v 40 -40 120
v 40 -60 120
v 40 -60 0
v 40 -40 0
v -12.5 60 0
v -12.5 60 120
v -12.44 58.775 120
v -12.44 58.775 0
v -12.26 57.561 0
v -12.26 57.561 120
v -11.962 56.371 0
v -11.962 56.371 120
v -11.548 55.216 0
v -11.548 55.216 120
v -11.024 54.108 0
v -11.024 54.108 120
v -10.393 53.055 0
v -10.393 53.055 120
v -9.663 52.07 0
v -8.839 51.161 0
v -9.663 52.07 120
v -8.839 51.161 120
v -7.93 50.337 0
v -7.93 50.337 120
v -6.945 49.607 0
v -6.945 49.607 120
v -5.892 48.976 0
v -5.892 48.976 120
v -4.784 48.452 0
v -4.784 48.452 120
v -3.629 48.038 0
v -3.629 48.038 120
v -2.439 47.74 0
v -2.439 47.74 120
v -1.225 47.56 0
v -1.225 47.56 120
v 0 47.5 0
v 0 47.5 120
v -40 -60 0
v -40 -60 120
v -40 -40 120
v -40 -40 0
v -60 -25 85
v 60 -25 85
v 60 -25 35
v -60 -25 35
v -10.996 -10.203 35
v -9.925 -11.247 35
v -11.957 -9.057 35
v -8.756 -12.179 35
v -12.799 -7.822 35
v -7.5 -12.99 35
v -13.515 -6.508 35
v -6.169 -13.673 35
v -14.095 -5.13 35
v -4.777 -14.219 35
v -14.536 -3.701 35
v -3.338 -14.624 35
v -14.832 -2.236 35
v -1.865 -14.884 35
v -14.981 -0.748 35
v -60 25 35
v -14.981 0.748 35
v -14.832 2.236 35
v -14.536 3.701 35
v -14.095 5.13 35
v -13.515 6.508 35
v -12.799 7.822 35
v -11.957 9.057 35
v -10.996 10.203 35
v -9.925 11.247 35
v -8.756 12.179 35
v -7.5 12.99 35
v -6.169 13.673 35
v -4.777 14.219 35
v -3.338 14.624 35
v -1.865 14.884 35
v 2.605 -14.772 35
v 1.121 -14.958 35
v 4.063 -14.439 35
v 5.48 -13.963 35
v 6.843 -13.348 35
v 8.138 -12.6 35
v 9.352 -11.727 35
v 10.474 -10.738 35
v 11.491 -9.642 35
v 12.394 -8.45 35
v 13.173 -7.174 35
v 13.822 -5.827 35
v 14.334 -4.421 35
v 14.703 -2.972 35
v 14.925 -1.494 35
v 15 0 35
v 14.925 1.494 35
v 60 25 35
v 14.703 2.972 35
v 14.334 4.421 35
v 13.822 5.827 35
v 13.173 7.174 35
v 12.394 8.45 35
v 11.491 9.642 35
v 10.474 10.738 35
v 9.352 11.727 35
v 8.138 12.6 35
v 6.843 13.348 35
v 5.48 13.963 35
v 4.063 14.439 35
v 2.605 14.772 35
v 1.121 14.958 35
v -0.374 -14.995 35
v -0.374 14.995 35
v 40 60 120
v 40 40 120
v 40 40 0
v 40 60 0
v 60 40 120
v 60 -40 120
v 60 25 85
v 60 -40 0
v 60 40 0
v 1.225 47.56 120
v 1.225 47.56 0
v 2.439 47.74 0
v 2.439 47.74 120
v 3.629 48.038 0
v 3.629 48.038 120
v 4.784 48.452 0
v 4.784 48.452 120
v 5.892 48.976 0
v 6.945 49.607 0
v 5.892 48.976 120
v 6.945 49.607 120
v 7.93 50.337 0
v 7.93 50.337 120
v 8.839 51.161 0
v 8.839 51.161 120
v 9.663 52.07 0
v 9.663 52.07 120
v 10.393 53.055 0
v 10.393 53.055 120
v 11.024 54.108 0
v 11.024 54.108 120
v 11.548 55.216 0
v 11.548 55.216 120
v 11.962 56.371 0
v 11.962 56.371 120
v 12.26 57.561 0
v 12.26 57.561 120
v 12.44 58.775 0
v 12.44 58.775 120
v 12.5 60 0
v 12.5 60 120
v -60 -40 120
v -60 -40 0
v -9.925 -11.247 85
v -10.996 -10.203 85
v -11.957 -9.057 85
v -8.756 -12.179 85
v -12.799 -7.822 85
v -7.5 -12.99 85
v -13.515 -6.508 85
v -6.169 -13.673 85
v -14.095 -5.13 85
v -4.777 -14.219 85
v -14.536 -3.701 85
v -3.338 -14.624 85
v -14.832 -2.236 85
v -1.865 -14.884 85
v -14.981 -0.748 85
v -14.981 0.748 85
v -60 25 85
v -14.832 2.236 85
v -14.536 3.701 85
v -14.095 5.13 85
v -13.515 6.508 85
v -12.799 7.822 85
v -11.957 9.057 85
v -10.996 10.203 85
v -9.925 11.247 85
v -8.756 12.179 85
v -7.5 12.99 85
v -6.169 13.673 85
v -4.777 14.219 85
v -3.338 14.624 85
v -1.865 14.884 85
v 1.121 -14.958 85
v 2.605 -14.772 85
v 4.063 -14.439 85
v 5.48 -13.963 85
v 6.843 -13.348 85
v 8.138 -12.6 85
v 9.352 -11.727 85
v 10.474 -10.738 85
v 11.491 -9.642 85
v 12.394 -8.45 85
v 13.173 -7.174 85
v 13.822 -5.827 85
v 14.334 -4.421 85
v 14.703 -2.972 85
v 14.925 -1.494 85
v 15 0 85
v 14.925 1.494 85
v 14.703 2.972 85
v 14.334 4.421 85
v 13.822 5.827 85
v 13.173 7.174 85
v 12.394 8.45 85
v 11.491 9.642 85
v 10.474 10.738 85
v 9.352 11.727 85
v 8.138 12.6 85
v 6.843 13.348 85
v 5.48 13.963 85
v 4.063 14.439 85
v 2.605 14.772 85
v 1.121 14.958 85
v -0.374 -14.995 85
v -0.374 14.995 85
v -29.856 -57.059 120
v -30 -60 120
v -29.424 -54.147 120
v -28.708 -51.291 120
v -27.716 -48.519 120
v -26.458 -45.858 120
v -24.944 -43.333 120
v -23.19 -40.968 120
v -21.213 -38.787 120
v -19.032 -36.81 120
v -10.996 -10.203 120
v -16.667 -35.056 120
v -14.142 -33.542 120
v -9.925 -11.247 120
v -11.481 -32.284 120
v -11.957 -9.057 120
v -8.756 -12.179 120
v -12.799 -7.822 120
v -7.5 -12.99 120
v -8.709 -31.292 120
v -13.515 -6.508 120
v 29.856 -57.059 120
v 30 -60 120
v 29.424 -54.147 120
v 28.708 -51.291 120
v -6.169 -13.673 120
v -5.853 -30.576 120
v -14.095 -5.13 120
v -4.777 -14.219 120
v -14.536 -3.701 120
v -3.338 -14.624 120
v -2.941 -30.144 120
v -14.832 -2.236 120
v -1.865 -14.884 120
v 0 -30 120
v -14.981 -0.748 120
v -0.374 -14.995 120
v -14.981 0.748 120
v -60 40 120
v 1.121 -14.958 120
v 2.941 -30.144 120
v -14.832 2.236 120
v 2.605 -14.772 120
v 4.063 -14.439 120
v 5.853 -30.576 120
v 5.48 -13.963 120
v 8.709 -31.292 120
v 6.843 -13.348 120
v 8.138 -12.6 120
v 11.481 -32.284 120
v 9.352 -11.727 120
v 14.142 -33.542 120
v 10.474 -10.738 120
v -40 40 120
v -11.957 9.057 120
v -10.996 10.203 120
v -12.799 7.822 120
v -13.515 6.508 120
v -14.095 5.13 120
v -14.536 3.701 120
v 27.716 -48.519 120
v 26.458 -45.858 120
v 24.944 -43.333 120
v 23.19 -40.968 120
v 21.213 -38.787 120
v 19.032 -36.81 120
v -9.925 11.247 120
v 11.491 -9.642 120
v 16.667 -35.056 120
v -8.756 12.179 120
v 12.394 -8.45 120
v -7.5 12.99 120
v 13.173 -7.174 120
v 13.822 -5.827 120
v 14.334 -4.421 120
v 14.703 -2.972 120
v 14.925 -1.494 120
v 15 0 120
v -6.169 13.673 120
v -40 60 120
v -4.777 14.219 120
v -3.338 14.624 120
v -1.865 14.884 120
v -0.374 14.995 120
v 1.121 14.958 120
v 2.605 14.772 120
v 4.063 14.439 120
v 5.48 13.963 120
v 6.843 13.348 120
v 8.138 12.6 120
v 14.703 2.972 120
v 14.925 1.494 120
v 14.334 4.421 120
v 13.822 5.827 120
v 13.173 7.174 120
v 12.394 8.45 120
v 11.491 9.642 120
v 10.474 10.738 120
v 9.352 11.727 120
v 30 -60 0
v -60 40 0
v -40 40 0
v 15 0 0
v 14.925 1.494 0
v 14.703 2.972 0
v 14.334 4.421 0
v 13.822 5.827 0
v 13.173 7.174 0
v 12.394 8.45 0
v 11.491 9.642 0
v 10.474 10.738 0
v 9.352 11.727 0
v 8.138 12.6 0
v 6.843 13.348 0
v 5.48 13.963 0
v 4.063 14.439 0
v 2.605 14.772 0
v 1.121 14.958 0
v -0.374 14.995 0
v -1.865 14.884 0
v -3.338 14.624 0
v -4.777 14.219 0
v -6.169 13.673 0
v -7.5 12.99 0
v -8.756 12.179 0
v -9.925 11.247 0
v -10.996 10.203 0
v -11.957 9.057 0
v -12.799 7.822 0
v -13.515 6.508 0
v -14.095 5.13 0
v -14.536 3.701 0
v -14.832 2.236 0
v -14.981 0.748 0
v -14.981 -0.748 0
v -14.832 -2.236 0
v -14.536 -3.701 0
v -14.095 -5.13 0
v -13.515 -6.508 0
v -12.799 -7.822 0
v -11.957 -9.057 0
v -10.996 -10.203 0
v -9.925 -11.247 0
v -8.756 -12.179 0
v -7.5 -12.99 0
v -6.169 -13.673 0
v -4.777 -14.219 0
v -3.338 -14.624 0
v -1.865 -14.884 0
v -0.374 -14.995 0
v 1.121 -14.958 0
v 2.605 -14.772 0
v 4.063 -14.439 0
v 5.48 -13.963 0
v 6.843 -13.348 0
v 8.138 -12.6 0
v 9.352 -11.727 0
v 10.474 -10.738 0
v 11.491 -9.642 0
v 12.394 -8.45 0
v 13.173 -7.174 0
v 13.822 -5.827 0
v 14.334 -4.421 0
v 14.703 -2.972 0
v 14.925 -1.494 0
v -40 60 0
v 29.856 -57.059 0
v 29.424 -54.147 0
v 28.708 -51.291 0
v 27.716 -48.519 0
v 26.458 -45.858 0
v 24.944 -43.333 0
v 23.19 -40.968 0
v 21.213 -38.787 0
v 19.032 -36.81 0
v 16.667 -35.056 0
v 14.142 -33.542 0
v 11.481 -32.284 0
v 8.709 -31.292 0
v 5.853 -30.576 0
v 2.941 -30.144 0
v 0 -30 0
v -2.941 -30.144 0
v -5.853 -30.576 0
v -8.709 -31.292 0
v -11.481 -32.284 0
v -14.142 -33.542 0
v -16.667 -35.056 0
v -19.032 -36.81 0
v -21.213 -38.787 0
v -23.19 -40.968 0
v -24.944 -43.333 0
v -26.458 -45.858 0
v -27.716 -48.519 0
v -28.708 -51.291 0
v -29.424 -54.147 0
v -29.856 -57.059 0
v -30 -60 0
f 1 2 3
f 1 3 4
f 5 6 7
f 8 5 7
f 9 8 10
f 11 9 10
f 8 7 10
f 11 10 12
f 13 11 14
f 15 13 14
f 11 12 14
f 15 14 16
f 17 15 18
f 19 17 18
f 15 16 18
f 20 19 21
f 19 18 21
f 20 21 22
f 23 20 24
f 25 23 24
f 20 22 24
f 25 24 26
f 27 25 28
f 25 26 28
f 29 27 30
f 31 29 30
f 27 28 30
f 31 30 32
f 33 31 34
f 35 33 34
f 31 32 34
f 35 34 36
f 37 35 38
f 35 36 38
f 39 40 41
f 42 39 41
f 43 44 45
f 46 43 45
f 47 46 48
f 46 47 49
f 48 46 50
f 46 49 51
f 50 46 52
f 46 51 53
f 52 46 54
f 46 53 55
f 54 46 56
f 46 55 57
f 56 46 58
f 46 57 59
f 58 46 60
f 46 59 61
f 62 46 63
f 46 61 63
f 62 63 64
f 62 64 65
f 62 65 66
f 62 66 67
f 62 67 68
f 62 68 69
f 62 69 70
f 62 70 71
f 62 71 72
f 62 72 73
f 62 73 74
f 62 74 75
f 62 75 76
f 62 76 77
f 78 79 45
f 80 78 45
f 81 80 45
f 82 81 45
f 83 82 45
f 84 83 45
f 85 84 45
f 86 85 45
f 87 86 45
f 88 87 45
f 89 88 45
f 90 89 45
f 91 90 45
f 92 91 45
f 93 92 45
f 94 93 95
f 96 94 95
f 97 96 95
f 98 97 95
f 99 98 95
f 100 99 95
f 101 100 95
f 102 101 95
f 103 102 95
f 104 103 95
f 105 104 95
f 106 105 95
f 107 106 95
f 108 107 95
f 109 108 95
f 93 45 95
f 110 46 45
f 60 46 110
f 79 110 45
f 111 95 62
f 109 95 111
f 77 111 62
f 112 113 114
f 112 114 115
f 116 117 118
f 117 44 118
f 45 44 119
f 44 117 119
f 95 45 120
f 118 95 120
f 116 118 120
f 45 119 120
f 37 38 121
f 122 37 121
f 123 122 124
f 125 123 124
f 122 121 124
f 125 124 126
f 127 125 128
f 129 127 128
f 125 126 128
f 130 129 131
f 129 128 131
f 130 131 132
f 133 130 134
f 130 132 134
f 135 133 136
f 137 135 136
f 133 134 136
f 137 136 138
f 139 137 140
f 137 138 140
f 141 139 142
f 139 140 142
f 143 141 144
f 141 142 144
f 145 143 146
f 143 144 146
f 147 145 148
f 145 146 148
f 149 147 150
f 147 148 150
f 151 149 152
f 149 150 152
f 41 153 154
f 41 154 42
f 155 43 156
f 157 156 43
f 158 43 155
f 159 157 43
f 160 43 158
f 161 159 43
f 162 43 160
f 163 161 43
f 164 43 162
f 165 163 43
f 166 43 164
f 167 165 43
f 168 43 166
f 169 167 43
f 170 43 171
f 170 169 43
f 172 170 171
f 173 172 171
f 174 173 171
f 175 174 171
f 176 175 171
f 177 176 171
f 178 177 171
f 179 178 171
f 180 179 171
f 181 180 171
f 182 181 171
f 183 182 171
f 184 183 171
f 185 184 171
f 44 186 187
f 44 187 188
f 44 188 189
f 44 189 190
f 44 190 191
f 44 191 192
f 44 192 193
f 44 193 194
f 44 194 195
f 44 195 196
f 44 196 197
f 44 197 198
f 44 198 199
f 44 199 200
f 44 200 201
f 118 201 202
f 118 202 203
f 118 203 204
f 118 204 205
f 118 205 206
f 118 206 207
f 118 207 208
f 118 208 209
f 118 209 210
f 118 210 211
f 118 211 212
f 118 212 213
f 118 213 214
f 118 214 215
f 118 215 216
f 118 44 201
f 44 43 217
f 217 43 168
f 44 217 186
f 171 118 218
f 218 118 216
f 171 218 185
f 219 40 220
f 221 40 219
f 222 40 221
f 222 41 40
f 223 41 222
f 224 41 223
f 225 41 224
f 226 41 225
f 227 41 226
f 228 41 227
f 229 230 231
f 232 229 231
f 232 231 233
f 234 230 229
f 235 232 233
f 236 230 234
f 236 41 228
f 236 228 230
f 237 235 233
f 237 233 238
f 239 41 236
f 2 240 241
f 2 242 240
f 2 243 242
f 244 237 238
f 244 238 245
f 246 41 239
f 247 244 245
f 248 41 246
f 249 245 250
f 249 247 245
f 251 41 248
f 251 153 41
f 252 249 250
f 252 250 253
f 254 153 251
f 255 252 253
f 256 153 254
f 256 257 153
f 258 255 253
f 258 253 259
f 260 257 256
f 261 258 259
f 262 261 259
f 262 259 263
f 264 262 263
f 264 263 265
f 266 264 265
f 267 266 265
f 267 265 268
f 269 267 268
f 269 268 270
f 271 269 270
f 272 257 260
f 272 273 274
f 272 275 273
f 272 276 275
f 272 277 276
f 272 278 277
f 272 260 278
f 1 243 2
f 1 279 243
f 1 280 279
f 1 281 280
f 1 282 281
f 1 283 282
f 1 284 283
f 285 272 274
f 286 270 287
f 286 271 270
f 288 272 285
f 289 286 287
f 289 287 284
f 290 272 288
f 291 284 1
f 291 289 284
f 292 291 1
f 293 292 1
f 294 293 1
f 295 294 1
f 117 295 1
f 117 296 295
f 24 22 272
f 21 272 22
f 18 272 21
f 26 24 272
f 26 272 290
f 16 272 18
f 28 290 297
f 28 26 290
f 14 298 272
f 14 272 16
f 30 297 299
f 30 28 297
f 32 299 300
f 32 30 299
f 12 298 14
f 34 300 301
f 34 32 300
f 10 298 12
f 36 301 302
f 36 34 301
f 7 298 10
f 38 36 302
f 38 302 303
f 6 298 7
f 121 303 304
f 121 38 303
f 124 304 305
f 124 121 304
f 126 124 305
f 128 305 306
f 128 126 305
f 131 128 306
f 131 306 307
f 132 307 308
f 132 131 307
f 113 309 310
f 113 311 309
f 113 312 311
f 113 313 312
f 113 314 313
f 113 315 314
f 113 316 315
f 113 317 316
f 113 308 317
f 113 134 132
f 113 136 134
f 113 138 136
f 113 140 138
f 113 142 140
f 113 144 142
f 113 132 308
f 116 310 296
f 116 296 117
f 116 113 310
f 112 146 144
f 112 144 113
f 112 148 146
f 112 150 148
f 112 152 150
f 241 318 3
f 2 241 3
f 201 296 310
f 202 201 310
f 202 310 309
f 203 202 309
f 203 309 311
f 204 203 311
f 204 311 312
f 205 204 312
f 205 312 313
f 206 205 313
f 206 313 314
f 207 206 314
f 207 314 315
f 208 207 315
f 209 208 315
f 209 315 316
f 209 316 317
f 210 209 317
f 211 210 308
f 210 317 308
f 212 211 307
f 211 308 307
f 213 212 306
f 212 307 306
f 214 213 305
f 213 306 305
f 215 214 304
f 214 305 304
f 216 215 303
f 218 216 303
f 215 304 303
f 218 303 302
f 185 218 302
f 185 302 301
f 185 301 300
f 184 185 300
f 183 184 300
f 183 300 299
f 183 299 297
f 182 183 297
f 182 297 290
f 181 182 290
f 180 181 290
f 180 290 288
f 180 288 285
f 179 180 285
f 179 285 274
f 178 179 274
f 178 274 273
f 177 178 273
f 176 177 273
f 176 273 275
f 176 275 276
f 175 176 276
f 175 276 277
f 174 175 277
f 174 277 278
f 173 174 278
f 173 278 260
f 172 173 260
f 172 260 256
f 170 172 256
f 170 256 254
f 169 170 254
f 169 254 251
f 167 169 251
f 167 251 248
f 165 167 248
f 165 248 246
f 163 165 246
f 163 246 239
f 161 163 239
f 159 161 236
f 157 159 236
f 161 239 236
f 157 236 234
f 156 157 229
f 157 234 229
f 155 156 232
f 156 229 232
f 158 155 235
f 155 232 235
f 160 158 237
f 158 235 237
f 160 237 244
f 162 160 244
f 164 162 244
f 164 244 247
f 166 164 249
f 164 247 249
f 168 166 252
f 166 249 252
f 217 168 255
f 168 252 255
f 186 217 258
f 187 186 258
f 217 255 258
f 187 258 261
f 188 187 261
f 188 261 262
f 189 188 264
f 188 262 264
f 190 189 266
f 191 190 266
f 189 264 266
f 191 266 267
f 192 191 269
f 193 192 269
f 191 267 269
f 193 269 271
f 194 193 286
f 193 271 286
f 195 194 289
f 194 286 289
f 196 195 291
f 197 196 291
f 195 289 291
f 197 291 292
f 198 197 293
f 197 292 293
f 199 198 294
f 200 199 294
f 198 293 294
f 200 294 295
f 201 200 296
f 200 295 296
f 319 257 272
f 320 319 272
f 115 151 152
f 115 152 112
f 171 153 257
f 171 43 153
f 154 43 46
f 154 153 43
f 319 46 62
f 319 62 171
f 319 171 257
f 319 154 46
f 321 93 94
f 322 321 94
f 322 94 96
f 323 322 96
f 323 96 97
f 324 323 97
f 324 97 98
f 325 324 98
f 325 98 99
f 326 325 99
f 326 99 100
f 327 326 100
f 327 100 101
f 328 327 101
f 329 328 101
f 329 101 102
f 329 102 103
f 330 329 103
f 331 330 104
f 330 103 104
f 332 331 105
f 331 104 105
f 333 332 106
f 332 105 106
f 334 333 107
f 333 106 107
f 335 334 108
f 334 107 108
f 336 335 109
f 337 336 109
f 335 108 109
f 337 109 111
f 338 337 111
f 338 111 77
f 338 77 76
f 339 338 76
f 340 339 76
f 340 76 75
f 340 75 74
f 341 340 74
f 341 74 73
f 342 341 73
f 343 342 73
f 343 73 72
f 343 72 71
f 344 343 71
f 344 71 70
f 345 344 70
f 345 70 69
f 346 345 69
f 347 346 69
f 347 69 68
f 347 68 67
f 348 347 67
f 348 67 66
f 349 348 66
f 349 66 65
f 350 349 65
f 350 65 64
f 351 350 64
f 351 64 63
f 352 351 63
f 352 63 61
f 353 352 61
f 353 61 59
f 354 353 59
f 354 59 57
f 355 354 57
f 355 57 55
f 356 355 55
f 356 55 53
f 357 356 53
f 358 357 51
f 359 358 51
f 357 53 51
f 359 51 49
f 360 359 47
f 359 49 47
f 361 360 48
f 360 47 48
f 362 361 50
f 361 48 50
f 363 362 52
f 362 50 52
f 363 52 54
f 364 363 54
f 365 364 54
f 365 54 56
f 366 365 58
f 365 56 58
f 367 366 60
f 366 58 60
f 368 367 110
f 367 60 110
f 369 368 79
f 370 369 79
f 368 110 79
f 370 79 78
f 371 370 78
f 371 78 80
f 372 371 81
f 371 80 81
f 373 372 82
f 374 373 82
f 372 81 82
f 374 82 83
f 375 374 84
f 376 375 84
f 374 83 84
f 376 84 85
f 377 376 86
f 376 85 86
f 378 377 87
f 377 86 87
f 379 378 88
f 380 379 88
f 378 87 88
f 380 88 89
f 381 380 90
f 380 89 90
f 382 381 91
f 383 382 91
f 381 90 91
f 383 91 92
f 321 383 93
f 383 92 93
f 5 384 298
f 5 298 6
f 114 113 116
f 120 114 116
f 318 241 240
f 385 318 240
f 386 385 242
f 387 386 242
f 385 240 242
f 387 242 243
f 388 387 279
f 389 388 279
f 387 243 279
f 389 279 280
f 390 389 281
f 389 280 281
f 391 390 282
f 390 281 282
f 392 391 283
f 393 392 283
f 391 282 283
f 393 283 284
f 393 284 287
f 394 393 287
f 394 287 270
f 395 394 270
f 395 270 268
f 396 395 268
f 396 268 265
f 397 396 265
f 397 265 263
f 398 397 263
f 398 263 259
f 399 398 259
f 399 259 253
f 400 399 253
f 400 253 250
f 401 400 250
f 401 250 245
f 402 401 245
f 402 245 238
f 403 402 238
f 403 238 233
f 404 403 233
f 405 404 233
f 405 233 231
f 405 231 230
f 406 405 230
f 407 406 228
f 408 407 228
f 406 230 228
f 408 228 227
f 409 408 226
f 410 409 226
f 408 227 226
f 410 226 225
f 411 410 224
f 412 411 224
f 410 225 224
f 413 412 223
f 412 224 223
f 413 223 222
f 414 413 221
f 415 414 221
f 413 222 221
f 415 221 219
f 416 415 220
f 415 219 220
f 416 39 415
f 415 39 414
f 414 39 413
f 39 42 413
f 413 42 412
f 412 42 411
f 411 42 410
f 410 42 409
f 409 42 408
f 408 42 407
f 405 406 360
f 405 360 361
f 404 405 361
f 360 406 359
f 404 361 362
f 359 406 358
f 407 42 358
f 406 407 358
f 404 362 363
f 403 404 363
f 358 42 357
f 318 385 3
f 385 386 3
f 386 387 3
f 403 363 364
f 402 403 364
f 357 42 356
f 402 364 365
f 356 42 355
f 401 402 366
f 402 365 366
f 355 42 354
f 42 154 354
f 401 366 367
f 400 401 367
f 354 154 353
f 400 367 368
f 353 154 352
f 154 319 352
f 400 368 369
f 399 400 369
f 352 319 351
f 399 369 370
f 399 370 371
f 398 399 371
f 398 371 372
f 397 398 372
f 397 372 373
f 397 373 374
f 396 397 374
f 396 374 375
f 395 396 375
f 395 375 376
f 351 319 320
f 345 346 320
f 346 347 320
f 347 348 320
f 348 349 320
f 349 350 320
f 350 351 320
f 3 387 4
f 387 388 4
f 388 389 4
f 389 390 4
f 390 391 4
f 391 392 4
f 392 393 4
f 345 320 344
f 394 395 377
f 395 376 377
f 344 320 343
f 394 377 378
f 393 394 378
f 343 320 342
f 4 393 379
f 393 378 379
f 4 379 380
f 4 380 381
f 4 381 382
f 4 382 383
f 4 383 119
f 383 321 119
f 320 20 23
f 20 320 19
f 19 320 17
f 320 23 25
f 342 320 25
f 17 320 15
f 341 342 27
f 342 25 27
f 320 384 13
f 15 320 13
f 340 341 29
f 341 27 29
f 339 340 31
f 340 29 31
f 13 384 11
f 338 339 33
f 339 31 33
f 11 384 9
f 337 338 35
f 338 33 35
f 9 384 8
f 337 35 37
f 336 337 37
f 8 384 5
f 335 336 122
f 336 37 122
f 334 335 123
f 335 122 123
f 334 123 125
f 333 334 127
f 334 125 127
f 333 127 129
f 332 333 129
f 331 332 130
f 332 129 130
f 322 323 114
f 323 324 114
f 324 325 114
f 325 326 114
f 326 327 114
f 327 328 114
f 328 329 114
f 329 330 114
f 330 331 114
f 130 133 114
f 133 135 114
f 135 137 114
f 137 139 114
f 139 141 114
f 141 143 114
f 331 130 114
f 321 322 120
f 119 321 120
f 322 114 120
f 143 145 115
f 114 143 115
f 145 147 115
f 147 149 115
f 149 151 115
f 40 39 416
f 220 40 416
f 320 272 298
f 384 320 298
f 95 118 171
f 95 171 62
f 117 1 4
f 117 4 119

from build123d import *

# Parameters (mm, degrees)
SKETCH1_W           = 120
SKETCH1_H           = 120
BOSS_EXTRUDE1_DEPTH = 120
SKETCH2_R           = 30
SKETCH2_W           = 20
SKETCH2_H           = 20
CUT_EXTRUDE1_DEPTH  = 120
SKETCH4_R           = 15
CUT_EXTRUDE2_DEPTH  = 120
SKETCH5_W           = 20
SKETCH5_H           = 20
CUT_EXTRUDE3_DEPTH  = 120
SKETCH6_W           = 50
SKETCH6_H           = 50
CUT_EXTRUDE4_DEPTH  = 120


with BuildPart() as part:
    # Sketch1 → Boss-Extrude1 (new body)
    with BuildSketch(Plane.XY):
        Rectangle(SKETCH1_W, SKETCH1_H)
    extrude(amount=BOSS_EXTRUDE1_DEPTH)

    # Sketch2 → Cut-Extrude1 (cut)
    with BuildSketch(Plane.XY.offset(120)):
        with Locations((0, -60)):
            Circle(SKETCH2_R)
        with Locations((50, -50)):
            Rectangle(SKETCH2_W, SKETCH2_H)
        with Locations((-50, -50)):
            Rectangle(SKETCH2_W, SKETCH2_H)
    extrude(amount=-CUT_EXTRUDE1_DEPTH, mode=Mode.SUBTRACT)

    # Sketch4 → Cut-Extrude2 (cut)
    with BuildSketch(Plane.XY.offset(120)):
        Circle(SKETCH4_R)
    extrude(amount=-CUT_EXTRUDE2_DEPTH, mode=Mode.SUBTRACT)

    # Sketch5 → Cut-Extrude3 (cut)
    with BuildSketch(Plane.XY.offset(120)):
        with Locations((-50, 50)):
            Rectangle(SKETCH5_W, SKETCH5_H)
        with BuildLine():
            Line((0, 60), (-12.5, 60))
            ThreePointArc((-12.5, 60), (-8.838834765, 51.161165235), (0, 47.5))
            Line((0, 47.5), (0, 60))
        make_face()
        with BuildLine():
            Line((0, 60), (0, 47.5))
            ThreePointArc((0, 47.5), (8.838834765, 51.161165235), (12.5, 60))
            Line((12.5, 60), (0, 60))
        make_face()
        with Locations((50, 50)):
            Rectangle(SKETCH5_W, SKETCH5_H)
    extrude(amount=-CUT_EXTRUDE3_DEPTH, mode=Mode.SUBTRACT)

    # Sketch6 → Cut-Extrude4 (cut)
    with BuildSketch(Plane(origin=(60, 0, 0), x_dir=(0, 0, -1), z_dir=(1, 0, 0))):
        with Locations((-60, 0)):
            Rectangle(SKETCH6_W, SKETCH6_H)
    extrude(amount=-CUT_EXTRUDE4_DEPTH, mode=Mode.SUBTRACT)


solid = part.part
